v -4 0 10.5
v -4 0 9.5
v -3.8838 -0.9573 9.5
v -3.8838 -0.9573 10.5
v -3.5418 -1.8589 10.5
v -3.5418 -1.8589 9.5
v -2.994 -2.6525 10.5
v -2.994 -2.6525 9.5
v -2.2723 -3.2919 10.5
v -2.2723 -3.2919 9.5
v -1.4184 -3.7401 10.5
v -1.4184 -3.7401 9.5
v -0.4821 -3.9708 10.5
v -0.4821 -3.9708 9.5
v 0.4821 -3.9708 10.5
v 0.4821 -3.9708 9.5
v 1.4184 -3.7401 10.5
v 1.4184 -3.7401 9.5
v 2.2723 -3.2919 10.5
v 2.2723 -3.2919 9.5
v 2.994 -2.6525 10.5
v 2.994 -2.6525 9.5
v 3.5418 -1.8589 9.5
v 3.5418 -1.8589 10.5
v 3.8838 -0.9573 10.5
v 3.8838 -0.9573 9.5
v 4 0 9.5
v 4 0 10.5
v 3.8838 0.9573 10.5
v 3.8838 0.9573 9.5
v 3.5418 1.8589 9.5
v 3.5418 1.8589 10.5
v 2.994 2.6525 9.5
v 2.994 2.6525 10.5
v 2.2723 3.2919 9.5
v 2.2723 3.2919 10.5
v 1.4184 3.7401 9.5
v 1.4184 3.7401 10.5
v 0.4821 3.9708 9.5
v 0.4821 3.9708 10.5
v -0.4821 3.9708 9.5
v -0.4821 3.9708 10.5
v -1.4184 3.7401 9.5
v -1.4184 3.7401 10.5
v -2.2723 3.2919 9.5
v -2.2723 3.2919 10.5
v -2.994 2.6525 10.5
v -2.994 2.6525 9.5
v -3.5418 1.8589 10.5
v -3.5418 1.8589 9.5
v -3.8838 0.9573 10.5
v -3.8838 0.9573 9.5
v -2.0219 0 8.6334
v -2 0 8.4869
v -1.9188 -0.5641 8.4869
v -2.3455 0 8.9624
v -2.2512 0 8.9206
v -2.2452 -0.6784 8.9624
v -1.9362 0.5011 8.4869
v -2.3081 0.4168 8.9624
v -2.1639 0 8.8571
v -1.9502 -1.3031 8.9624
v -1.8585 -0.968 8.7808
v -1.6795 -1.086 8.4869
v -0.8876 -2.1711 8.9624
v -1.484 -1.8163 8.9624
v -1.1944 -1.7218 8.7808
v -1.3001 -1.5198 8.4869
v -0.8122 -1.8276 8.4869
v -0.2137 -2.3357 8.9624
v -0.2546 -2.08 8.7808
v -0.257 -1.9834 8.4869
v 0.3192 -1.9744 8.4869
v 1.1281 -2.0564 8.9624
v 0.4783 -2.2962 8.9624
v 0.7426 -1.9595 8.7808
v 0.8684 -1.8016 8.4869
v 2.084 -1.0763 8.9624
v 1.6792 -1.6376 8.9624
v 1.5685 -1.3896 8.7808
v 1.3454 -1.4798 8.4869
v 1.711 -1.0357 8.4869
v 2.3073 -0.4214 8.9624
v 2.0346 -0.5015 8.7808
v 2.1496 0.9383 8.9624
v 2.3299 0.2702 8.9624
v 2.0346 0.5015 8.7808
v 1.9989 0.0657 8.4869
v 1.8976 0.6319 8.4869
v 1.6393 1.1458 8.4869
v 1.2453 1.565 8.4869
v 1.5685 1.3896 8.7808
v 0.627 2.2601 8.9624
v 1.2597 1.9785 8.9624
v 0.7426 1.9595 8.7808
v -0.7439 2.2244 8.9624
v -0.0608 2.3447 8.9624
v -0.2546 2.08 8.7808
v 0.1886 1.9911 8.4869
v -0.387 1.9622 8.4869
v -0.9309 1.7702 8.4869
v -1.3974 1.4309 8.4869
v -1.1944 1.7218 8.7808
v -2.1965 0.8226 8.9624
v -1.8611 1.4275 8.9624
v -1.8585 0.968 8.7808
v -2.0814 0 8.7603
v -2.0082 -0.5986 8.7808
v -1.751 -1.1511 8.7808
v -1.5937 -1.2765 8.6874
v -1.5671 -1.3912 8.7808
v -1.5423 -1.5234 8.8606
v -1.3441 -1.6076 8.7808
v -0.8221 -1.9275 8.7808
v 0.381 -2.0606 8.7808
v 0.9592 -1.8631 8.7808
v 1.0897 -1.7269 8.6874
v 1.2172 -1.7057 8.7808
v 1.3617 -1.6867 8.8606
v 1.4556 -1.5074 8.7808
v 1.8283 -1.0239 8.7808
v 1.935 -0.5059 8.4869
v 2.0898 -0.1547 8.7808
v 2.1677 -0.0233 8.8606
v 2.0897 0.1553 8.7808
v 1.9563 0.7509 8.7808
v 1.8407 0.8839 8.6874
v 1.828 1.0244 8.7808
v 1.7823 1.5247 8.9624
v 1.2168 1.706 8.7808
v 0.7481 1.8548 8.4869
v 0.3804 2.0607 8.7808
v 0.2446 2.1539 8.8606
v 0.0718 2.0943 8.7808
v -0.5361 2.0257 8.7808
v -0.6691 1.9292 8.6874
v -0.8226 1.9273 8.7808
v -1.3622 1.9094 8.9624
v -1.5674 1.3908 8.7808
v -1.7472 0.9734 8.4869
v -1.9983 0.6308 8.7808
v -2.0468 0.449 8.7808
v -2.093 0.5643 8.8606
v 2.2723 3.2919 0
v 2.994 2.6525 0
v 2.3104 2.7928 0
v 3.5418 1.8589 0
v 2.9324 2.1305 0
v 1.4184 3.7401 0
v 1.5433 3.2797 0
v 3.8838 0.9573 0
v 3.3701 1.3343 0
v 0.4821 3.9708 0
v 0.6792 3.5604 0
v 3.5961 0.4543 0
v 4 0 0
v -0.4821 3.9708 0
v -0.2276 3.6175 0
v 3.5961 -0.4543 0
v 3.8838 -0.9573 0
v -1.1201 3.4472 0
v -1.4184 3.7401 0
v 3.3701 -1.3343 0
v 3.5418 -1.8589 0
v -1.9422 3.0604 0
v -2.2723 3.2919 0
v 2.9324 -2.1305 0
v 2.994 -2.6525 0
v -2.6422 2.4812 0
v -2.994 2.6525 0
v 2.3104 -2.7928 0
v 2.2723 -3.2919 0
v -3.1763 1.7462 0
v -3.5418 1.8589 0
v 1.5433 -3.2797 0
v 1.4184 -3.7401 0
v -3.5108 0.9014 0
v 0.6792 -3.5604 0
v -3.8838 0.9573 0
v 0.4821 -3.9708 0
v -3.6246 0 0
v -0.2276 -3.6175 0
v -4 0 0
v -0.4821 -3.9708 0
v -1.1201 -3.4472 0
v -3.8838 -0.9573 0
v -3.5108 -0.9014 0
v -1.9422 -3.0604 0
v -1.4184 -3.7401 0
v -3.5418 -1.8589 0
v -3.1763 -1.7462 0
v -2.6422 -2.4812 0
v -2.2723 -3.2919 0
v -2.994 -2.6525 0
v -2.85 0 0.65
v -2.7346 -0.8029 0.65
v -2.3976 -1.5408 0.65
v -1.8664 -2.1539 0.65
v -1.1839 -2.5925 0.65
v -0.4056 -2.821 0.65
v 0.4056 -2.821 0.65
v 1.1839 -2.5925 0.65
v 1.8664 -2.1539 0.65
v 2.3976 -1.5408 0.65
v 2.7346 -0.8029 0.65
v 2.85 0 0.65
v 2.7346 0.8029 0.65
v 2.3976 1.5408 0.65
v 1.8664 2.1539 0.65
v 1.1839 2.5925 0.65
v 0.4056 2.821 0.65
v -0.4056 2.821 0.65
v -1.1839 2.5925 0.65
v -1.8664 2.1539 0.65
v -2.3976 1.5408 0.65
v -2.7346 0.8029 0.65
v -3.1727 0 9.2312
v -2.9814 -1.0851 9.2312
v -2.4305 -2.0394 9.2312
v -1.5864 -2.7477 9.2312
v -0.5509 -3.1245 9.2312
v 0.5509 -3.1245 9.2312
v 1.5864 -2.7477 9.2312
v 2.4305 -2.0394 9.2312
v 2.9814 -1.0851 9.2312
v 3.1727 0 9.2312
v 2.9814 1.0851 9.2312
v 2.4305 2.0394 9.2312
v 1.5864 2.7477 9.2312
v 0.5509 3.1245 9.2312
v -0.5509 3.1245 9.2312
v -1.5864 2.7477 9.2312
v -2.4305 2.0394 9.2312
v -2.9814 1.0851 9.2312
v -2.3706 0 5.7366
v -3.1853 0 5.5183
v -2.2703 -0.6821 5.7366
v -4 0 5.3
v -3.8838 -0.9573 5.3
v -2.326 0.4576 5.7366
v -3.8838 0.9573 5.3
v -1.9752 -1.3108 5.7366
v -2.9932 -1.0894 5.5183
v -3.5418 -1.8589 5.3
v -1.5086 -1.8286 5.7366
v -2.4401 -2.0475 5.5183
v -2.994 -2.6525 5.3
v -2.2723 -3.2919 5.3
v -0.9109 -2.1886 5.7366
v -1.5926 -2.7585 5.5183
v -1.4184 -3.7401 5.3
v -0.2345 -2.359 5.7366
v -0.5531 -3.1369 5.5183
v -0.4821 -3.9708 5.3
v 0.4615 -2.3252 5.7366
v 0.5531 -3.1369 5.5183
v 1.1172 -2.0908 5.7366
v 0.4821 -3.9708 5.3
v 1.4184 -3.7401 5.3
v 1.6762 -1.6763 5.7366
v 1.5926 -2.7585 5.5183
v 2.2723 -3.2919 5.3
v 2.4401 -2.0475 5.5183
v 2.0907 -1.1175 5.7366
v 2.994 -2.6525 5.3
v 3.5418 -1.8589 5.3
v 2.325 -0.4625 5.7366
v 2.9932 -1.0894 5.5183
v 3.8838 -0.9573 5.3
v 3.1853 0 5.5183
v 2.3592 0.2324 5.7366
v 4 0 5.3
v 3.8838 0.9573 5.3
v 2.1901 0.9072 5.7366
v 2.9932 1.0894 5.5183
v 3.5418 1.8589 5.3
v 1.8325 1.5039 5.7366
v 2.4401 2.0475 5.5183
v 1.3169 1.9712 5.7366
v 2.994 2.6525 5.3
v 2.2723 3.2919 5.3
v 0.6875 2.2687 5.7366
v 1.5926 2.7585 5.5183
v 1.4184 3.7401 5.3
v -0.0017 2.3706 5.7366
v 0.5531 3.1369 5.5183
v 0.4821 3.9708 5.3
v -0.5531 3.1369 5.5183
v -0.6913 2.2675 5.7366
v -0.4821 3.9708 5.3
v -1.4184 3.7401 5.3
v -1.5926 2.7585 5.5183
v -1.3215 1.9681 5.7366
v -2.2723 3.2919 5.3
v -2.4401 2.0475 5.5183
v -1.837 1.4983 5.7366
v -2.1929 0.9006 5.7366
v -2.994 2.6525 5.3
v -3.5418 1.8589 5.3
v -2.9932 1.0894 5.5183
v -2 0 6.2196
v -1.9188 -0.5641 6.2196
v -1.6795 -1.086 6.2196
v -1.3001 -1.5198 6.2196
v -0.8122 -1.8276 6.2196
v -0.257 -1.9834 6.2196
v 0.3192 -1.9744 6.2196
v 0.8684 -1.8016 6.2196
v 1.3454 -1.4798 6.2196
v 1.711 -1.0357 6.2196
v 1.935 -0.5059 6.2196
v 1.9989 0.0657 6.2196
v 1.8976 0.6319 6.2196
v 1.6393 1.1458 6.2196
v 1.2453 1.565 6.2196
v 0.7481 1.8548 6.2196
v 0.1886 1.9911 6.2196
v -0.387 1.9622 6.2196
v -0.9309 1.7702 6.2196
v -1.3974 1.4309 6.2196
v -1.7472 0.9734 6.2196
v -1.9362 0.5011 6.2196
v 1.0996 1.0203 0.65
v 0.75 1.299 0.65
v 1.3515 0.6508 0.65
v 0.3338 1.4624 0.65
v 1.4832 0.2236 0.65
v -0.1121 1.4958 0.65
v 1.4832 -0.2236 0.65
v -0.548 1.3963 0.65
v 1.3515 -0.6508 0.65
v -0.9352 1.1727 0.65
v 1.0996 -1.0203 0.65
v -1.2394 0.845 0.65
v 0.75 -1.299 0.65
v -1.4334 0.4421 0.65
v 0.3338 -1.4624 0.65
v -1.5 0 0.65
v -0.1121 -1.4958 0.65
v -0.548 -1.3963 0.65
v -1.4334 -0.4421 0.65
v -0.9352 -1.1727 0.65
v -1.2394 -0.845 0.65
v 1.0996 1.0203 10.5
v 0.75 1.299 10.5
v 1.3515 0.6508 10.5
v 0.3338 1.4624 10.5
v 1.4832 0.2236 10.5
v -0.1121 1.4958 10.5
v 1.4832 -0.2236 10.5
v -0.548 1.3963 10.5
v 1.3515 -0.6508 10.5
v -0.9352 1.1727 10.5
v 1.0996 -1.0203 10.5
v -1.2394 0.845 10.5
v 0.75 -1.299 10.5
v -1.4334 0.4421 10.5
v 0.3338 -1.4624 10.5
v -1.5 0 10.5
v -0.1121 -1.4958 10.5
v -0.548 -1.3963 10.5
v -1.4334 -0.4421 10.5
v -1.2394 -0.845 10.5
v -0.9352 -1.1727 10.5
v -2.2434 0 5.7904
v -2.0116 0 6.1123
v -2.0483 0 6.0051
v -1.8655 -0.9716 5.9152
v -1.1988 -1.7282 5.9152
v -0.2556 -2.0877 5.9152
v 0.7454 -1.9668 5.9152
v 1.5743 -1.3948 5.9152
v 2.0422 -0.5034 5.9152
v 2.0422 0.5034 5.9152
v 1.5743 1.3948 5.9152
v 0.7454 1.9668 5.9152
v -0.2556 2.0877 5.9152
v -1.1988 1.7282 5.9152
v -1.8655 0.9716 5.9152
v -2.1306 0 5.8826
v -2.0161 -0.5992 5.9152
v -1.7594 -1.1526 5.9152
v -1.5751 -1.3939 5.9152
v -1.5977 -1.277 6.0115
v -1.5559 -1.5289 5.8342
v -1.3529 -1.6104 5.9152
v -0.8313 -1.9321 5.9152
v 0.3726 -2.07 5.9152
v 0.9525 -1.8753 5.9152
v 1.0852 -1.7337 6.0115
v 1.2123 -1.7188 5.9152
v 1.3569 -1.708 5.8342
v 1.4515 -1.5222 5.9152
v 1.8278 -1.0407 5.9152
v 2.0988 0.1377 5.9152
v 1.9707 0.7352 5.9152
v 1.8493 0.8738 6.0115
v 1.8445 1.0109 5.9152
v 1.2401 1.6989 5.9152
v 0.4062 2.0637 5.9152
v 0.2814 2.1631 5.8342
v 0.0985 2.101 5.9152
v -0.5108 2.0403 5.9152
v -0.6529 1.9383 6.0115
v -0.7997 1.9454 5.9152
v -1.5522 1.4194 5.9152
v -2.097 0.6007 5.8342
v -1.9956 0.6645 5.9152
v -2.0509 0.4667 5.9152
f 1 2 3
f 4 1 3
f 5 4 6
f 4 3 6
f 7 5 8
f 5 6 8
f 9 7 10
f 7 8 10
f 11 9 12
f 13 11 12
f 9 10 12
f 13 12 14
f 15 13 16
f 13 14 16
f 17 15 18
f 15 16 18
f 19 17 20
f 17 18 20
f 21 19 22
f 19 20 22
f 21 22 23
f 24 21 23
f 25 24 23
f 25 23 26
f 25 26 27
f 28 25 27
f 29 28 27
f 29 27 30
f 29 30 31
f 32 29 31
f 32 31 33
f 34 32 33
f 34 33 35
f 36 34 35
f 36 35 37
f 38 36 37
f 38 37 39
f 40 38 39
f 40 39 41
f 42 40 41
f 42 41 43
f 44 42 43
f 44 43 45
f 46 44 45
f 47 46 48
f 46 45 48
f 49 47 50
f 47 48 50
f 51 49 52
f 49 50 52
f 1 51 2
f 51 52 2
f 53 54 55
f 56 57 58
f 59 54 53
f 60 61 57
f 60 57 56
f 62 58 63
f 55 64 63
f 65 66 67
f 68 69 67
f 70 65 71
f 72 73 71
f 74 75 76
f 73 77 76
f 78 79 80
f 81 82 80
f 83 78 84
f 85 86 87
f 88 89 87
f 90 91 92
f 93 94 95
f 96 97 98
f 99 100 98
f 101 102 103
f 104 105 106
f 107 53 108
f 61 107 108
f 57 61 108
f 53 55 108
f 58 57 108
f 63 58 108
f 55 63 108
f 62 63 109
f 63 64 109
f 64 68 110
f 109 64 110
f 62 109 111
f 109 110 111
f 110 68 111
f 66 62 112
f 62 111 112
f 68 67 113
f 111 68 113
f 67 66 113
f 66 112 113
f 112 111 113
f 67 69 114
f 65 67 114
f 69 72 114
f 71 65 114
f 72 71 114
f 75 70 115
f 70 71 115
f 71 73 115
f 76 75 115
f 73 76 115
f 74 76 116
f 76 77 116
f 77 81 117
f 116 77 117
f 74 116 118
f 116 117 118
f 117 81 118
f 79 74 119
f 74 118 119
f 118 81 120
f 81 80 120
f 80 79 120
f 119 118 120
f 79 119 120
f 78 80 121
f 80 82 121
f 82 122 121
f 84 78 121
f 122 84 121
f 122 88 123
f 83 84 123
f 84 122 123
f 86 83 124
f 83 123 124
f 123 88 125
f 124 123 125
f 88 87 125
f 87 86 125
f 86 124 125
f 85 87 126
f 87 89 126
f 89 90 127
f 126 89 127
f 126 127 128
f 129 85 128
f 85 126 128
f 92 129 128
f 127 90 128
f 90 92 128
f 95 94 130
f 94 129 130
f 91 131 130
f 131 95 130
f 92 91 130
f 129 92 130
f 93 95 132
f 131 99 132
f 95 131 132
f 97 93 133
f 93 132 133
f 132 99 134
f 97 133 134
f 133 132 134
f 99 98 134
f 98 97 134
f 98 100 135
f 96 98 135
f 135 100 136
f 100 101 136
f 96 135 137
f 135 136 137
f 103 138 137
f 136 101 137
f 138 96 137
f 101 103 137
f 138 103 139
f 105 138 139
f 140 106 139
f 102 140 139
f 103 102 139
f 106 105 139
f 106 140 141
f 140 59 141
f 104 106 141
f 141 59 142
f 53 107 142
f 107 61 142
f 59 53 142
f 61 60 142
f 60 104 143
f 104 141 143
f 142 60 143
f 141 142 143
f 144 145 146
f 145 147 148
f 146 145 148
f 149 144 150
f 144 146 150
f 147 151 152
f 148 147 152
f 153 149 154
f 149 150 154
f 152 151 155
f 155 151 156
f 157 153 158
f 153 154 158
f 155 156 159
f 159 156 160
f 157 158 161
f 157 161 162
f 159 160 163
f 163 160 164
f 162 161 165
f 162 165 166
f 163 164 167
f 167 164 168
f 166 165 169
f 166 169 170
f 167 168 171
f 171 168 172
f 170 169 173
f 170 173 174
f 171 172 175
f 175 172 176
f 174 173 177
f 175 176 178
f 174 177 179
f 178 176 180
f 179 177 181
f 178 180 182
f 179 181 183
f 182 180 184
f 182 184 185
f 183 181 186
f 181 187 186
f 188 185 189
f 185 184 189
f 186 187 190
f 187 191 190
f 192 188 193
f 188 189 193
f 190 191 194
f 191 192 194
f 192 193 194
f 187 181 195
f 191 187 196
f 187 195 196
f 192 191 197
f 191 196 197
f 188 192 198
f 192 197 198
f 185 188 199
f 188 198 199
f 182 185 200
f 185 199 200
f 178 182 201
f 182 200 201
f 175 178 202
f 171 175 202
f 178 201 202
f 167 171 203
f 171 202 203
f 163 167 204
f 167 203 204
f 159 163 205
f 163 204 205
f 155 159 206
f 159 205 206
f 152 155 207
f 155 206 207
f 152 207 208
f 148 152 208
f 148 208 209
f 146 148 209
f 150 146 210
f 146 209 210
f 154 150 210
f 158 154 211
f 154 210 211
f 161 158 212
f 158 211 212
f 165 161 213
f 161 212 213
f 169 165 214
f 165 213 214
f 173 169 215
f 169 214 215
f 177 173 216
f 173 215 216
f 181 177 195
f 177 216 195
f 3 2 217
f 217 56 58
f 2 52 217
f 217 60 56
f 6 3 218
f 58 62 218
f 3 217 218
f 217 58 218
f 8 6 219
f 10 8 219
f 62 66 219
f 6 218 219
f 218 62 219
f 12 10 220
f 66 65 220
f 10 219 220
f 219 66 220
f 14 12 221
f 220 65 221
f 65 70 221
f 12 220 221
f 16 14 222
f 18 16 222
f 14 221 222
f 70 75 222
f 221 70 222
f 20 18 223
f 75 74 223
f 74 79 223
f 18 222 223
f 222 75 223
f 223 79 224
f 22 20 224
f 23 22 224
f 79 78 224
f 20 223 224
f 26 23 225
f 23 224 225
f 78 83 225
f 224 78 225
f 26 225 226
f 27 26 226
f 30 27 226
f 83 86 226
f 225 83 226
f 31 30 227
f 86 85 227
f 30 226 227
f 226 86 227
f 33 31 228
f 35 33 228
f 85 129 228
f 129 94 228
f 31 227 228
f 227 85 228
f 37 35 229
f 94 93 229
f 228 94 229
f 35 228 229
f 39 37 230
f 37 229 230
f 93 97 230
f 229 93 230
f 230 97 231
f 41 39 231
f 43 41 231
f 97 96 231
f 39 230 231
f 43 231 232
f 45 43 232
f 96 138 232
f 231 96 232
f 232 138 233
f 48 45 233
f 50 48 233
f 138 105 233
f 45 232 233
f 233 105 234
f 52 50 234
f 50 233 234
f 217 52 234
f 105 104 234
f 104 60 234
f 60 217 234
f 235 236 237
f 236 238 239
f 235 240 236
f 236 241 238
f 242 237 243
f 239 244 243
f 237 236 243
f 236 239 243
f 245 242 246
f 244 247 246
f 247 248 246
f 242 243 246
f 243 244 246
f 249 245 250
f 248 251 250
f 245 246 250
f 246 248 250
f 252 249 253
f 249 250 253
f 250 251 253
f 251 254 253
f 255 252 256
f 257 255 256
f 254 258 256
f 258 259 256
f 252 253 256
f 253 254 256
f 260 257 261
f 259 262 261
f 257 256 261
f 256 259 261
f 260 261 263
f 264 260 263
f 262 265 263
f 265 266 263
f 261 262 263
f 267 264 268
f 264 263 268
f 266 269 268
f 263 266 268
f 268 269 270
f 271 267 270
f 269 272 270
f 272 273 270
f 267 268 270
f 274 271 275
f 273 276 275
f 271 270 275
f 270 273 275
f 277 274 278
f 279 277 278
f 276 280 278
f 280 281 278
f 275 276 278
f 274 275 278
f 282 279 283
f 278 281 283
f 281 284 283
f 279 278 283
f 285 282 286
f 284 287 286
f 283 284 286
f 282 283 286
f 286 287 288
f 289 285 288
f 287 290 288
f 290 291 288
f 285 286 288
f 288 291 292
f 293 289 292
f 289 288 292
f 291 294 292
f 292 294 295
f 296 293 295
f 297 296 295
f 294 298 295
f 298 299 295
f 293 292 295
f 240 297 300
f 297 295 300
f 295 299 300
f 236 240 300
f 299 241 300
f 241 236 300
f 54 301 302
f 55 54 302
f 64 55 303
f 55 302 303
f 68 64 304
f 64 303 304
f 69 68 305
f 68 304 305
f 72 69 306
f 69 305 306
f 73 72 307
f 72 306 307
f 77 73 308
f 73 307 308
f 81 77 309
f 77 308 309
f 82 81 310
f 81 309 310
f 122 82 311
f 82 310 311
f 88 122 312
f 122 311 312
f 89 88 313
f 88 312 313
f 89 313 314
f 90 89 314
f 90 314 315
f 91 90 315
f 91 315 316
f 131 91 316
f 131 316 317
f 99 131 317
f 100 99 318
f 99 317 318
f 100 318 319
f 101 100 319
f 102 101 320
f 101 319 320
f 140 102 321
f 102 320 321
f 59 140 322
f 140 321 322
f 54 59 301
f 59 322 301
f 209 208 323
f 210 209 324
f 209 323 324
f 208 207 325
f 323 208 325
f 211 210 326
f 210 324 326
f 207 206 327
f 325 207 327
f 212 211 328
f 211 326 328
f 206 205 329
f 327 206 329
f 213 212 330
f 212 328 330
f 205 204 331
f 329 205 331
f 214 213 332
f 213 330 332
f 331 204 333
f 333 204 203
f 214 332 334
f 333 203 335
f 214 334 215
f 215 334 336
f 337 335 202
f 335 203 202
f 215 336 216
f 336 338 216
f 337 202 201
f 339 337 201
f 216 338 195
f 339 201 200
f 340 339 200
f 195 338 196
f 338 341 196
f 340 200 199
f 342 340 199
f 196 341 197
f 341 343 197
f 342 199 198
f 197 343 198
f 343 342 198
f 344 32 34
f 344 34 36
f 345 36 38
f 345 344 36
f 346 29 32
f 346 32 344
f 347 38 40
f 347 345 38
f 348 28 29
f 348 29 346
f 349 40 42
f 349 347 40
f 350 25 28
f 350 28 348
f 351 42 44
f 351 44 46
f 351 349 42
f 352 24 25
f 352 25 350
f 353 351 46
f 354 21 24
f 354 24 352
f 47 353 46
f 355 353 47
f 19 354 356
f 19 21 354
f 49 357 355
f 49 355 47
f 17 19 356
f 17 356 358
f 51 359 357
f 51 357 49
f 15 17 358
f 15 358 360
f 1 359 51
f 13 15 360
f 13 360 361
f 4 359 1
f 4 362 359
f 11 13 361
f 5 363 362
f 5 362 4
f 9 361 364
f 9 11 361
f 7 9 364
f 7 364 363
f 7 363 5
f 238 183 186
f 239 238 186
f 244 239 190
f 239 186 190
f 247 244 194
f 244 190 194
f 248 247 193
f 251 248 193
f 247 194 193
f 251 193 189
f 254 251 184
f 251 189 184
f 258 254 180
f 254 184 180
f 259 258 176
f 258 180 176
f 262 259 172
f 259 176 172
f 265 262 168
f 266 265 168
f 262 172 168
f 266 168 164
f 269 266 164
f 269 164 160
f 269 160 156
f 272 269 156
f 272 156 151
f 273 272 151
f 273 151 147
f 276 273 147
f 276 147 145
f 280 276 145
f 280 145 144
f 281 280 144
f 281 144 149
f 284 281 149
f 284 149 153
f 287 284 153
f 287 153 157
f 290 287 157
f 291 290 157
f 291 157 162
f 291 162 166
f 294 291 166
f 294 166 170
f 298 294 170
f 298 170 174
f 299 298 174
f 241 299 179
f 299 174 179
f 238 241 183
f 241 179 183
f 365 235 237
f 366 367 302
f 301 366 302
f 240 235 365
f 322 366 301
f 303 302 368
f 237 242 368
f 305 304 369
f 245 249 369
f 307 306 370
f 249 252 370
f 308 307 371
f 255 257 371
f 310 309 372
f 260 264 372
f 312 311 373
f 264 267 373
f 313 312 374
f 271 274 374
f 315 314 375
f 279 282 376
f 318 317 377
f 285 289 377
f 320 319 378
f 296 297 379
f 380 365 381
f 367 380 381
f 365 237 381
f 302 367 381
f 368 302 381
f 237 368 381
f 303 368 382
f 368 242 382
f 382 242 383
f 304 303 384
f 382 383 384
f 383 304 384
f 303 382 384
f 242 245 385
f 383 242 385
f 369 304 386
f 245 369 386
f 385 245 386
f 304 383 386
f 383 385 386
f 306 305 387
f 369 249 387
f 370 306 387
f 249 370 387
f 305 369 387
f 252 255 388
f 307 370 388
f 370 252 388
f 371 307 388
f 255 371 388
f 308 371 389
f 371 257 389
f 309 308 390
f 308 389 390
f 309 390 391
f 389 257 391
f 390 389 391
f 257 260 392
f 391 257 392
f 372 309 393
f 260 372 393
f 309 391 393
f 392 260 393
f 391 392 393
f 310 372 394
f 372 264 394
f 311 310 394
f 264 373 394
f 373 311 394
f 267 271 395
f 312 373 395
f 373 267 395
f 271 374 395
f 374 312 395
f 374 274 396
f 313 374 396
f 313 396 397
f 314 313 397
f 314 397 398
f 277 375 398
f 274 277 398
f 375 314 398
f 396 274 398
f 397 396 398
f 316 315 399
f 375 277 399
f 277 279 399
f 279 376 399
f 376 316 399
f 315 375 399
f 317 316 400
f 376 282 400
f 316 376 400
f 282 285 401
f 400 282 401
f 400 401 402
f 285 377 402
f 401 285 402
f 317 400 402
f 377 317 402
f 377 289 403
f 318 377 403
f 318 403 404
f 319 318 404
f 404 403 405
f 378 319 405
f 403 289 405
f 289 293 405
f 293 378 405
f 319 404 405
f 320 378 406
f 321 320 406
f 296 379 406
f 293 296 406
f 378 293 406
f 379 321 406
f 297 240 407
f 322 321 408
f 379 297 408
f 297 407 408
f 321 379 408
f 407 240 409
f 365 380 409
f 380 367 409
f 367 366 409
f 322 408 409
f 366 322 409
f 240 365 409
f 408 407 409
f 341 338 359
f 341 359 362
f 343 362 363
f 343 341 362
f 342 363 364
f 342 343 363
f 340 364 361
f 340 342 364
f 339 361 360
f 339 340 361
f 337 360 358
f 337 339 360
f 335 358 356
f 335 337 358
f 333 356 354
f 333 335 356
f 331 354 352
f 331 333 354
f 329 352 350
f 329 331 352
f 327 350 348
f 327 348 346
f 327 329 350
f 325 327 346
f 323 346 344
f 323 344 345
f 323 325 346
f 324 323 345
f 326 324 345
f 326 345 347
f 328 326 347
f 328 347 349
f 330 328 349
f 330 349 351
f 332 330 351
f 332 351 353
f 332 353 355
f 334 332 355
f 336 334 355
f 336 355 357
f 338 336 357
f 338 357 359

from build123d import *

# Parameters (mm, degrees)
SKETCH_1_R      = 4
SKETCH_1_R_2    = 1.5
EXTRUDE_1_DEPTH = 10.5
FILLET_1_R      = 0.5


with BuildPart() as part:
    # 草图1 → 凸台-拉伸1 (new body)
    with BuildSketch(Plane.XY):
        with Locations(Location((0, 0, 0), (0, 0, 180))):
            Circle(SKETCH_1_R)
        with Locations(Location((0, 0, 0), (0, 0, 180))):
            Circle(SKETCH_1_R_2, mode=Mode.SUBTRACT)
    extrude(amount=EXTRUDE_1_DEPTH)

    # 草图3 → 切除-旋转1 (revolve, cut)
    with BuildSketch(Plane(origin=(0, 0, 0), x_dir=(1, 0, 0), z_dir=(0, 1, 0))):
        Polygon((-3.624639835, 0), (-2.85, -0.65), (0, -0.65), (0, 0), align=None)
        Polygon((-4, -5.3), (-4, -9.5), (-2, -8.850160608), (-2, -5.835898385), align=None)
    revolve(axis=Axis((0, 0, 0), (0, 0, 1)), mode=Mode.SUBTRACT)

    # 圆角1
    fillet_1_edges = [part.edges().sort_by_distance(p)[0] for p in [
        (2, 0, 5.835898385),
        (2, 0, 8.850160608),
    ]]
    fillet(fillet_1_edges, radius=FILLET_1_R)


solid = part.part
